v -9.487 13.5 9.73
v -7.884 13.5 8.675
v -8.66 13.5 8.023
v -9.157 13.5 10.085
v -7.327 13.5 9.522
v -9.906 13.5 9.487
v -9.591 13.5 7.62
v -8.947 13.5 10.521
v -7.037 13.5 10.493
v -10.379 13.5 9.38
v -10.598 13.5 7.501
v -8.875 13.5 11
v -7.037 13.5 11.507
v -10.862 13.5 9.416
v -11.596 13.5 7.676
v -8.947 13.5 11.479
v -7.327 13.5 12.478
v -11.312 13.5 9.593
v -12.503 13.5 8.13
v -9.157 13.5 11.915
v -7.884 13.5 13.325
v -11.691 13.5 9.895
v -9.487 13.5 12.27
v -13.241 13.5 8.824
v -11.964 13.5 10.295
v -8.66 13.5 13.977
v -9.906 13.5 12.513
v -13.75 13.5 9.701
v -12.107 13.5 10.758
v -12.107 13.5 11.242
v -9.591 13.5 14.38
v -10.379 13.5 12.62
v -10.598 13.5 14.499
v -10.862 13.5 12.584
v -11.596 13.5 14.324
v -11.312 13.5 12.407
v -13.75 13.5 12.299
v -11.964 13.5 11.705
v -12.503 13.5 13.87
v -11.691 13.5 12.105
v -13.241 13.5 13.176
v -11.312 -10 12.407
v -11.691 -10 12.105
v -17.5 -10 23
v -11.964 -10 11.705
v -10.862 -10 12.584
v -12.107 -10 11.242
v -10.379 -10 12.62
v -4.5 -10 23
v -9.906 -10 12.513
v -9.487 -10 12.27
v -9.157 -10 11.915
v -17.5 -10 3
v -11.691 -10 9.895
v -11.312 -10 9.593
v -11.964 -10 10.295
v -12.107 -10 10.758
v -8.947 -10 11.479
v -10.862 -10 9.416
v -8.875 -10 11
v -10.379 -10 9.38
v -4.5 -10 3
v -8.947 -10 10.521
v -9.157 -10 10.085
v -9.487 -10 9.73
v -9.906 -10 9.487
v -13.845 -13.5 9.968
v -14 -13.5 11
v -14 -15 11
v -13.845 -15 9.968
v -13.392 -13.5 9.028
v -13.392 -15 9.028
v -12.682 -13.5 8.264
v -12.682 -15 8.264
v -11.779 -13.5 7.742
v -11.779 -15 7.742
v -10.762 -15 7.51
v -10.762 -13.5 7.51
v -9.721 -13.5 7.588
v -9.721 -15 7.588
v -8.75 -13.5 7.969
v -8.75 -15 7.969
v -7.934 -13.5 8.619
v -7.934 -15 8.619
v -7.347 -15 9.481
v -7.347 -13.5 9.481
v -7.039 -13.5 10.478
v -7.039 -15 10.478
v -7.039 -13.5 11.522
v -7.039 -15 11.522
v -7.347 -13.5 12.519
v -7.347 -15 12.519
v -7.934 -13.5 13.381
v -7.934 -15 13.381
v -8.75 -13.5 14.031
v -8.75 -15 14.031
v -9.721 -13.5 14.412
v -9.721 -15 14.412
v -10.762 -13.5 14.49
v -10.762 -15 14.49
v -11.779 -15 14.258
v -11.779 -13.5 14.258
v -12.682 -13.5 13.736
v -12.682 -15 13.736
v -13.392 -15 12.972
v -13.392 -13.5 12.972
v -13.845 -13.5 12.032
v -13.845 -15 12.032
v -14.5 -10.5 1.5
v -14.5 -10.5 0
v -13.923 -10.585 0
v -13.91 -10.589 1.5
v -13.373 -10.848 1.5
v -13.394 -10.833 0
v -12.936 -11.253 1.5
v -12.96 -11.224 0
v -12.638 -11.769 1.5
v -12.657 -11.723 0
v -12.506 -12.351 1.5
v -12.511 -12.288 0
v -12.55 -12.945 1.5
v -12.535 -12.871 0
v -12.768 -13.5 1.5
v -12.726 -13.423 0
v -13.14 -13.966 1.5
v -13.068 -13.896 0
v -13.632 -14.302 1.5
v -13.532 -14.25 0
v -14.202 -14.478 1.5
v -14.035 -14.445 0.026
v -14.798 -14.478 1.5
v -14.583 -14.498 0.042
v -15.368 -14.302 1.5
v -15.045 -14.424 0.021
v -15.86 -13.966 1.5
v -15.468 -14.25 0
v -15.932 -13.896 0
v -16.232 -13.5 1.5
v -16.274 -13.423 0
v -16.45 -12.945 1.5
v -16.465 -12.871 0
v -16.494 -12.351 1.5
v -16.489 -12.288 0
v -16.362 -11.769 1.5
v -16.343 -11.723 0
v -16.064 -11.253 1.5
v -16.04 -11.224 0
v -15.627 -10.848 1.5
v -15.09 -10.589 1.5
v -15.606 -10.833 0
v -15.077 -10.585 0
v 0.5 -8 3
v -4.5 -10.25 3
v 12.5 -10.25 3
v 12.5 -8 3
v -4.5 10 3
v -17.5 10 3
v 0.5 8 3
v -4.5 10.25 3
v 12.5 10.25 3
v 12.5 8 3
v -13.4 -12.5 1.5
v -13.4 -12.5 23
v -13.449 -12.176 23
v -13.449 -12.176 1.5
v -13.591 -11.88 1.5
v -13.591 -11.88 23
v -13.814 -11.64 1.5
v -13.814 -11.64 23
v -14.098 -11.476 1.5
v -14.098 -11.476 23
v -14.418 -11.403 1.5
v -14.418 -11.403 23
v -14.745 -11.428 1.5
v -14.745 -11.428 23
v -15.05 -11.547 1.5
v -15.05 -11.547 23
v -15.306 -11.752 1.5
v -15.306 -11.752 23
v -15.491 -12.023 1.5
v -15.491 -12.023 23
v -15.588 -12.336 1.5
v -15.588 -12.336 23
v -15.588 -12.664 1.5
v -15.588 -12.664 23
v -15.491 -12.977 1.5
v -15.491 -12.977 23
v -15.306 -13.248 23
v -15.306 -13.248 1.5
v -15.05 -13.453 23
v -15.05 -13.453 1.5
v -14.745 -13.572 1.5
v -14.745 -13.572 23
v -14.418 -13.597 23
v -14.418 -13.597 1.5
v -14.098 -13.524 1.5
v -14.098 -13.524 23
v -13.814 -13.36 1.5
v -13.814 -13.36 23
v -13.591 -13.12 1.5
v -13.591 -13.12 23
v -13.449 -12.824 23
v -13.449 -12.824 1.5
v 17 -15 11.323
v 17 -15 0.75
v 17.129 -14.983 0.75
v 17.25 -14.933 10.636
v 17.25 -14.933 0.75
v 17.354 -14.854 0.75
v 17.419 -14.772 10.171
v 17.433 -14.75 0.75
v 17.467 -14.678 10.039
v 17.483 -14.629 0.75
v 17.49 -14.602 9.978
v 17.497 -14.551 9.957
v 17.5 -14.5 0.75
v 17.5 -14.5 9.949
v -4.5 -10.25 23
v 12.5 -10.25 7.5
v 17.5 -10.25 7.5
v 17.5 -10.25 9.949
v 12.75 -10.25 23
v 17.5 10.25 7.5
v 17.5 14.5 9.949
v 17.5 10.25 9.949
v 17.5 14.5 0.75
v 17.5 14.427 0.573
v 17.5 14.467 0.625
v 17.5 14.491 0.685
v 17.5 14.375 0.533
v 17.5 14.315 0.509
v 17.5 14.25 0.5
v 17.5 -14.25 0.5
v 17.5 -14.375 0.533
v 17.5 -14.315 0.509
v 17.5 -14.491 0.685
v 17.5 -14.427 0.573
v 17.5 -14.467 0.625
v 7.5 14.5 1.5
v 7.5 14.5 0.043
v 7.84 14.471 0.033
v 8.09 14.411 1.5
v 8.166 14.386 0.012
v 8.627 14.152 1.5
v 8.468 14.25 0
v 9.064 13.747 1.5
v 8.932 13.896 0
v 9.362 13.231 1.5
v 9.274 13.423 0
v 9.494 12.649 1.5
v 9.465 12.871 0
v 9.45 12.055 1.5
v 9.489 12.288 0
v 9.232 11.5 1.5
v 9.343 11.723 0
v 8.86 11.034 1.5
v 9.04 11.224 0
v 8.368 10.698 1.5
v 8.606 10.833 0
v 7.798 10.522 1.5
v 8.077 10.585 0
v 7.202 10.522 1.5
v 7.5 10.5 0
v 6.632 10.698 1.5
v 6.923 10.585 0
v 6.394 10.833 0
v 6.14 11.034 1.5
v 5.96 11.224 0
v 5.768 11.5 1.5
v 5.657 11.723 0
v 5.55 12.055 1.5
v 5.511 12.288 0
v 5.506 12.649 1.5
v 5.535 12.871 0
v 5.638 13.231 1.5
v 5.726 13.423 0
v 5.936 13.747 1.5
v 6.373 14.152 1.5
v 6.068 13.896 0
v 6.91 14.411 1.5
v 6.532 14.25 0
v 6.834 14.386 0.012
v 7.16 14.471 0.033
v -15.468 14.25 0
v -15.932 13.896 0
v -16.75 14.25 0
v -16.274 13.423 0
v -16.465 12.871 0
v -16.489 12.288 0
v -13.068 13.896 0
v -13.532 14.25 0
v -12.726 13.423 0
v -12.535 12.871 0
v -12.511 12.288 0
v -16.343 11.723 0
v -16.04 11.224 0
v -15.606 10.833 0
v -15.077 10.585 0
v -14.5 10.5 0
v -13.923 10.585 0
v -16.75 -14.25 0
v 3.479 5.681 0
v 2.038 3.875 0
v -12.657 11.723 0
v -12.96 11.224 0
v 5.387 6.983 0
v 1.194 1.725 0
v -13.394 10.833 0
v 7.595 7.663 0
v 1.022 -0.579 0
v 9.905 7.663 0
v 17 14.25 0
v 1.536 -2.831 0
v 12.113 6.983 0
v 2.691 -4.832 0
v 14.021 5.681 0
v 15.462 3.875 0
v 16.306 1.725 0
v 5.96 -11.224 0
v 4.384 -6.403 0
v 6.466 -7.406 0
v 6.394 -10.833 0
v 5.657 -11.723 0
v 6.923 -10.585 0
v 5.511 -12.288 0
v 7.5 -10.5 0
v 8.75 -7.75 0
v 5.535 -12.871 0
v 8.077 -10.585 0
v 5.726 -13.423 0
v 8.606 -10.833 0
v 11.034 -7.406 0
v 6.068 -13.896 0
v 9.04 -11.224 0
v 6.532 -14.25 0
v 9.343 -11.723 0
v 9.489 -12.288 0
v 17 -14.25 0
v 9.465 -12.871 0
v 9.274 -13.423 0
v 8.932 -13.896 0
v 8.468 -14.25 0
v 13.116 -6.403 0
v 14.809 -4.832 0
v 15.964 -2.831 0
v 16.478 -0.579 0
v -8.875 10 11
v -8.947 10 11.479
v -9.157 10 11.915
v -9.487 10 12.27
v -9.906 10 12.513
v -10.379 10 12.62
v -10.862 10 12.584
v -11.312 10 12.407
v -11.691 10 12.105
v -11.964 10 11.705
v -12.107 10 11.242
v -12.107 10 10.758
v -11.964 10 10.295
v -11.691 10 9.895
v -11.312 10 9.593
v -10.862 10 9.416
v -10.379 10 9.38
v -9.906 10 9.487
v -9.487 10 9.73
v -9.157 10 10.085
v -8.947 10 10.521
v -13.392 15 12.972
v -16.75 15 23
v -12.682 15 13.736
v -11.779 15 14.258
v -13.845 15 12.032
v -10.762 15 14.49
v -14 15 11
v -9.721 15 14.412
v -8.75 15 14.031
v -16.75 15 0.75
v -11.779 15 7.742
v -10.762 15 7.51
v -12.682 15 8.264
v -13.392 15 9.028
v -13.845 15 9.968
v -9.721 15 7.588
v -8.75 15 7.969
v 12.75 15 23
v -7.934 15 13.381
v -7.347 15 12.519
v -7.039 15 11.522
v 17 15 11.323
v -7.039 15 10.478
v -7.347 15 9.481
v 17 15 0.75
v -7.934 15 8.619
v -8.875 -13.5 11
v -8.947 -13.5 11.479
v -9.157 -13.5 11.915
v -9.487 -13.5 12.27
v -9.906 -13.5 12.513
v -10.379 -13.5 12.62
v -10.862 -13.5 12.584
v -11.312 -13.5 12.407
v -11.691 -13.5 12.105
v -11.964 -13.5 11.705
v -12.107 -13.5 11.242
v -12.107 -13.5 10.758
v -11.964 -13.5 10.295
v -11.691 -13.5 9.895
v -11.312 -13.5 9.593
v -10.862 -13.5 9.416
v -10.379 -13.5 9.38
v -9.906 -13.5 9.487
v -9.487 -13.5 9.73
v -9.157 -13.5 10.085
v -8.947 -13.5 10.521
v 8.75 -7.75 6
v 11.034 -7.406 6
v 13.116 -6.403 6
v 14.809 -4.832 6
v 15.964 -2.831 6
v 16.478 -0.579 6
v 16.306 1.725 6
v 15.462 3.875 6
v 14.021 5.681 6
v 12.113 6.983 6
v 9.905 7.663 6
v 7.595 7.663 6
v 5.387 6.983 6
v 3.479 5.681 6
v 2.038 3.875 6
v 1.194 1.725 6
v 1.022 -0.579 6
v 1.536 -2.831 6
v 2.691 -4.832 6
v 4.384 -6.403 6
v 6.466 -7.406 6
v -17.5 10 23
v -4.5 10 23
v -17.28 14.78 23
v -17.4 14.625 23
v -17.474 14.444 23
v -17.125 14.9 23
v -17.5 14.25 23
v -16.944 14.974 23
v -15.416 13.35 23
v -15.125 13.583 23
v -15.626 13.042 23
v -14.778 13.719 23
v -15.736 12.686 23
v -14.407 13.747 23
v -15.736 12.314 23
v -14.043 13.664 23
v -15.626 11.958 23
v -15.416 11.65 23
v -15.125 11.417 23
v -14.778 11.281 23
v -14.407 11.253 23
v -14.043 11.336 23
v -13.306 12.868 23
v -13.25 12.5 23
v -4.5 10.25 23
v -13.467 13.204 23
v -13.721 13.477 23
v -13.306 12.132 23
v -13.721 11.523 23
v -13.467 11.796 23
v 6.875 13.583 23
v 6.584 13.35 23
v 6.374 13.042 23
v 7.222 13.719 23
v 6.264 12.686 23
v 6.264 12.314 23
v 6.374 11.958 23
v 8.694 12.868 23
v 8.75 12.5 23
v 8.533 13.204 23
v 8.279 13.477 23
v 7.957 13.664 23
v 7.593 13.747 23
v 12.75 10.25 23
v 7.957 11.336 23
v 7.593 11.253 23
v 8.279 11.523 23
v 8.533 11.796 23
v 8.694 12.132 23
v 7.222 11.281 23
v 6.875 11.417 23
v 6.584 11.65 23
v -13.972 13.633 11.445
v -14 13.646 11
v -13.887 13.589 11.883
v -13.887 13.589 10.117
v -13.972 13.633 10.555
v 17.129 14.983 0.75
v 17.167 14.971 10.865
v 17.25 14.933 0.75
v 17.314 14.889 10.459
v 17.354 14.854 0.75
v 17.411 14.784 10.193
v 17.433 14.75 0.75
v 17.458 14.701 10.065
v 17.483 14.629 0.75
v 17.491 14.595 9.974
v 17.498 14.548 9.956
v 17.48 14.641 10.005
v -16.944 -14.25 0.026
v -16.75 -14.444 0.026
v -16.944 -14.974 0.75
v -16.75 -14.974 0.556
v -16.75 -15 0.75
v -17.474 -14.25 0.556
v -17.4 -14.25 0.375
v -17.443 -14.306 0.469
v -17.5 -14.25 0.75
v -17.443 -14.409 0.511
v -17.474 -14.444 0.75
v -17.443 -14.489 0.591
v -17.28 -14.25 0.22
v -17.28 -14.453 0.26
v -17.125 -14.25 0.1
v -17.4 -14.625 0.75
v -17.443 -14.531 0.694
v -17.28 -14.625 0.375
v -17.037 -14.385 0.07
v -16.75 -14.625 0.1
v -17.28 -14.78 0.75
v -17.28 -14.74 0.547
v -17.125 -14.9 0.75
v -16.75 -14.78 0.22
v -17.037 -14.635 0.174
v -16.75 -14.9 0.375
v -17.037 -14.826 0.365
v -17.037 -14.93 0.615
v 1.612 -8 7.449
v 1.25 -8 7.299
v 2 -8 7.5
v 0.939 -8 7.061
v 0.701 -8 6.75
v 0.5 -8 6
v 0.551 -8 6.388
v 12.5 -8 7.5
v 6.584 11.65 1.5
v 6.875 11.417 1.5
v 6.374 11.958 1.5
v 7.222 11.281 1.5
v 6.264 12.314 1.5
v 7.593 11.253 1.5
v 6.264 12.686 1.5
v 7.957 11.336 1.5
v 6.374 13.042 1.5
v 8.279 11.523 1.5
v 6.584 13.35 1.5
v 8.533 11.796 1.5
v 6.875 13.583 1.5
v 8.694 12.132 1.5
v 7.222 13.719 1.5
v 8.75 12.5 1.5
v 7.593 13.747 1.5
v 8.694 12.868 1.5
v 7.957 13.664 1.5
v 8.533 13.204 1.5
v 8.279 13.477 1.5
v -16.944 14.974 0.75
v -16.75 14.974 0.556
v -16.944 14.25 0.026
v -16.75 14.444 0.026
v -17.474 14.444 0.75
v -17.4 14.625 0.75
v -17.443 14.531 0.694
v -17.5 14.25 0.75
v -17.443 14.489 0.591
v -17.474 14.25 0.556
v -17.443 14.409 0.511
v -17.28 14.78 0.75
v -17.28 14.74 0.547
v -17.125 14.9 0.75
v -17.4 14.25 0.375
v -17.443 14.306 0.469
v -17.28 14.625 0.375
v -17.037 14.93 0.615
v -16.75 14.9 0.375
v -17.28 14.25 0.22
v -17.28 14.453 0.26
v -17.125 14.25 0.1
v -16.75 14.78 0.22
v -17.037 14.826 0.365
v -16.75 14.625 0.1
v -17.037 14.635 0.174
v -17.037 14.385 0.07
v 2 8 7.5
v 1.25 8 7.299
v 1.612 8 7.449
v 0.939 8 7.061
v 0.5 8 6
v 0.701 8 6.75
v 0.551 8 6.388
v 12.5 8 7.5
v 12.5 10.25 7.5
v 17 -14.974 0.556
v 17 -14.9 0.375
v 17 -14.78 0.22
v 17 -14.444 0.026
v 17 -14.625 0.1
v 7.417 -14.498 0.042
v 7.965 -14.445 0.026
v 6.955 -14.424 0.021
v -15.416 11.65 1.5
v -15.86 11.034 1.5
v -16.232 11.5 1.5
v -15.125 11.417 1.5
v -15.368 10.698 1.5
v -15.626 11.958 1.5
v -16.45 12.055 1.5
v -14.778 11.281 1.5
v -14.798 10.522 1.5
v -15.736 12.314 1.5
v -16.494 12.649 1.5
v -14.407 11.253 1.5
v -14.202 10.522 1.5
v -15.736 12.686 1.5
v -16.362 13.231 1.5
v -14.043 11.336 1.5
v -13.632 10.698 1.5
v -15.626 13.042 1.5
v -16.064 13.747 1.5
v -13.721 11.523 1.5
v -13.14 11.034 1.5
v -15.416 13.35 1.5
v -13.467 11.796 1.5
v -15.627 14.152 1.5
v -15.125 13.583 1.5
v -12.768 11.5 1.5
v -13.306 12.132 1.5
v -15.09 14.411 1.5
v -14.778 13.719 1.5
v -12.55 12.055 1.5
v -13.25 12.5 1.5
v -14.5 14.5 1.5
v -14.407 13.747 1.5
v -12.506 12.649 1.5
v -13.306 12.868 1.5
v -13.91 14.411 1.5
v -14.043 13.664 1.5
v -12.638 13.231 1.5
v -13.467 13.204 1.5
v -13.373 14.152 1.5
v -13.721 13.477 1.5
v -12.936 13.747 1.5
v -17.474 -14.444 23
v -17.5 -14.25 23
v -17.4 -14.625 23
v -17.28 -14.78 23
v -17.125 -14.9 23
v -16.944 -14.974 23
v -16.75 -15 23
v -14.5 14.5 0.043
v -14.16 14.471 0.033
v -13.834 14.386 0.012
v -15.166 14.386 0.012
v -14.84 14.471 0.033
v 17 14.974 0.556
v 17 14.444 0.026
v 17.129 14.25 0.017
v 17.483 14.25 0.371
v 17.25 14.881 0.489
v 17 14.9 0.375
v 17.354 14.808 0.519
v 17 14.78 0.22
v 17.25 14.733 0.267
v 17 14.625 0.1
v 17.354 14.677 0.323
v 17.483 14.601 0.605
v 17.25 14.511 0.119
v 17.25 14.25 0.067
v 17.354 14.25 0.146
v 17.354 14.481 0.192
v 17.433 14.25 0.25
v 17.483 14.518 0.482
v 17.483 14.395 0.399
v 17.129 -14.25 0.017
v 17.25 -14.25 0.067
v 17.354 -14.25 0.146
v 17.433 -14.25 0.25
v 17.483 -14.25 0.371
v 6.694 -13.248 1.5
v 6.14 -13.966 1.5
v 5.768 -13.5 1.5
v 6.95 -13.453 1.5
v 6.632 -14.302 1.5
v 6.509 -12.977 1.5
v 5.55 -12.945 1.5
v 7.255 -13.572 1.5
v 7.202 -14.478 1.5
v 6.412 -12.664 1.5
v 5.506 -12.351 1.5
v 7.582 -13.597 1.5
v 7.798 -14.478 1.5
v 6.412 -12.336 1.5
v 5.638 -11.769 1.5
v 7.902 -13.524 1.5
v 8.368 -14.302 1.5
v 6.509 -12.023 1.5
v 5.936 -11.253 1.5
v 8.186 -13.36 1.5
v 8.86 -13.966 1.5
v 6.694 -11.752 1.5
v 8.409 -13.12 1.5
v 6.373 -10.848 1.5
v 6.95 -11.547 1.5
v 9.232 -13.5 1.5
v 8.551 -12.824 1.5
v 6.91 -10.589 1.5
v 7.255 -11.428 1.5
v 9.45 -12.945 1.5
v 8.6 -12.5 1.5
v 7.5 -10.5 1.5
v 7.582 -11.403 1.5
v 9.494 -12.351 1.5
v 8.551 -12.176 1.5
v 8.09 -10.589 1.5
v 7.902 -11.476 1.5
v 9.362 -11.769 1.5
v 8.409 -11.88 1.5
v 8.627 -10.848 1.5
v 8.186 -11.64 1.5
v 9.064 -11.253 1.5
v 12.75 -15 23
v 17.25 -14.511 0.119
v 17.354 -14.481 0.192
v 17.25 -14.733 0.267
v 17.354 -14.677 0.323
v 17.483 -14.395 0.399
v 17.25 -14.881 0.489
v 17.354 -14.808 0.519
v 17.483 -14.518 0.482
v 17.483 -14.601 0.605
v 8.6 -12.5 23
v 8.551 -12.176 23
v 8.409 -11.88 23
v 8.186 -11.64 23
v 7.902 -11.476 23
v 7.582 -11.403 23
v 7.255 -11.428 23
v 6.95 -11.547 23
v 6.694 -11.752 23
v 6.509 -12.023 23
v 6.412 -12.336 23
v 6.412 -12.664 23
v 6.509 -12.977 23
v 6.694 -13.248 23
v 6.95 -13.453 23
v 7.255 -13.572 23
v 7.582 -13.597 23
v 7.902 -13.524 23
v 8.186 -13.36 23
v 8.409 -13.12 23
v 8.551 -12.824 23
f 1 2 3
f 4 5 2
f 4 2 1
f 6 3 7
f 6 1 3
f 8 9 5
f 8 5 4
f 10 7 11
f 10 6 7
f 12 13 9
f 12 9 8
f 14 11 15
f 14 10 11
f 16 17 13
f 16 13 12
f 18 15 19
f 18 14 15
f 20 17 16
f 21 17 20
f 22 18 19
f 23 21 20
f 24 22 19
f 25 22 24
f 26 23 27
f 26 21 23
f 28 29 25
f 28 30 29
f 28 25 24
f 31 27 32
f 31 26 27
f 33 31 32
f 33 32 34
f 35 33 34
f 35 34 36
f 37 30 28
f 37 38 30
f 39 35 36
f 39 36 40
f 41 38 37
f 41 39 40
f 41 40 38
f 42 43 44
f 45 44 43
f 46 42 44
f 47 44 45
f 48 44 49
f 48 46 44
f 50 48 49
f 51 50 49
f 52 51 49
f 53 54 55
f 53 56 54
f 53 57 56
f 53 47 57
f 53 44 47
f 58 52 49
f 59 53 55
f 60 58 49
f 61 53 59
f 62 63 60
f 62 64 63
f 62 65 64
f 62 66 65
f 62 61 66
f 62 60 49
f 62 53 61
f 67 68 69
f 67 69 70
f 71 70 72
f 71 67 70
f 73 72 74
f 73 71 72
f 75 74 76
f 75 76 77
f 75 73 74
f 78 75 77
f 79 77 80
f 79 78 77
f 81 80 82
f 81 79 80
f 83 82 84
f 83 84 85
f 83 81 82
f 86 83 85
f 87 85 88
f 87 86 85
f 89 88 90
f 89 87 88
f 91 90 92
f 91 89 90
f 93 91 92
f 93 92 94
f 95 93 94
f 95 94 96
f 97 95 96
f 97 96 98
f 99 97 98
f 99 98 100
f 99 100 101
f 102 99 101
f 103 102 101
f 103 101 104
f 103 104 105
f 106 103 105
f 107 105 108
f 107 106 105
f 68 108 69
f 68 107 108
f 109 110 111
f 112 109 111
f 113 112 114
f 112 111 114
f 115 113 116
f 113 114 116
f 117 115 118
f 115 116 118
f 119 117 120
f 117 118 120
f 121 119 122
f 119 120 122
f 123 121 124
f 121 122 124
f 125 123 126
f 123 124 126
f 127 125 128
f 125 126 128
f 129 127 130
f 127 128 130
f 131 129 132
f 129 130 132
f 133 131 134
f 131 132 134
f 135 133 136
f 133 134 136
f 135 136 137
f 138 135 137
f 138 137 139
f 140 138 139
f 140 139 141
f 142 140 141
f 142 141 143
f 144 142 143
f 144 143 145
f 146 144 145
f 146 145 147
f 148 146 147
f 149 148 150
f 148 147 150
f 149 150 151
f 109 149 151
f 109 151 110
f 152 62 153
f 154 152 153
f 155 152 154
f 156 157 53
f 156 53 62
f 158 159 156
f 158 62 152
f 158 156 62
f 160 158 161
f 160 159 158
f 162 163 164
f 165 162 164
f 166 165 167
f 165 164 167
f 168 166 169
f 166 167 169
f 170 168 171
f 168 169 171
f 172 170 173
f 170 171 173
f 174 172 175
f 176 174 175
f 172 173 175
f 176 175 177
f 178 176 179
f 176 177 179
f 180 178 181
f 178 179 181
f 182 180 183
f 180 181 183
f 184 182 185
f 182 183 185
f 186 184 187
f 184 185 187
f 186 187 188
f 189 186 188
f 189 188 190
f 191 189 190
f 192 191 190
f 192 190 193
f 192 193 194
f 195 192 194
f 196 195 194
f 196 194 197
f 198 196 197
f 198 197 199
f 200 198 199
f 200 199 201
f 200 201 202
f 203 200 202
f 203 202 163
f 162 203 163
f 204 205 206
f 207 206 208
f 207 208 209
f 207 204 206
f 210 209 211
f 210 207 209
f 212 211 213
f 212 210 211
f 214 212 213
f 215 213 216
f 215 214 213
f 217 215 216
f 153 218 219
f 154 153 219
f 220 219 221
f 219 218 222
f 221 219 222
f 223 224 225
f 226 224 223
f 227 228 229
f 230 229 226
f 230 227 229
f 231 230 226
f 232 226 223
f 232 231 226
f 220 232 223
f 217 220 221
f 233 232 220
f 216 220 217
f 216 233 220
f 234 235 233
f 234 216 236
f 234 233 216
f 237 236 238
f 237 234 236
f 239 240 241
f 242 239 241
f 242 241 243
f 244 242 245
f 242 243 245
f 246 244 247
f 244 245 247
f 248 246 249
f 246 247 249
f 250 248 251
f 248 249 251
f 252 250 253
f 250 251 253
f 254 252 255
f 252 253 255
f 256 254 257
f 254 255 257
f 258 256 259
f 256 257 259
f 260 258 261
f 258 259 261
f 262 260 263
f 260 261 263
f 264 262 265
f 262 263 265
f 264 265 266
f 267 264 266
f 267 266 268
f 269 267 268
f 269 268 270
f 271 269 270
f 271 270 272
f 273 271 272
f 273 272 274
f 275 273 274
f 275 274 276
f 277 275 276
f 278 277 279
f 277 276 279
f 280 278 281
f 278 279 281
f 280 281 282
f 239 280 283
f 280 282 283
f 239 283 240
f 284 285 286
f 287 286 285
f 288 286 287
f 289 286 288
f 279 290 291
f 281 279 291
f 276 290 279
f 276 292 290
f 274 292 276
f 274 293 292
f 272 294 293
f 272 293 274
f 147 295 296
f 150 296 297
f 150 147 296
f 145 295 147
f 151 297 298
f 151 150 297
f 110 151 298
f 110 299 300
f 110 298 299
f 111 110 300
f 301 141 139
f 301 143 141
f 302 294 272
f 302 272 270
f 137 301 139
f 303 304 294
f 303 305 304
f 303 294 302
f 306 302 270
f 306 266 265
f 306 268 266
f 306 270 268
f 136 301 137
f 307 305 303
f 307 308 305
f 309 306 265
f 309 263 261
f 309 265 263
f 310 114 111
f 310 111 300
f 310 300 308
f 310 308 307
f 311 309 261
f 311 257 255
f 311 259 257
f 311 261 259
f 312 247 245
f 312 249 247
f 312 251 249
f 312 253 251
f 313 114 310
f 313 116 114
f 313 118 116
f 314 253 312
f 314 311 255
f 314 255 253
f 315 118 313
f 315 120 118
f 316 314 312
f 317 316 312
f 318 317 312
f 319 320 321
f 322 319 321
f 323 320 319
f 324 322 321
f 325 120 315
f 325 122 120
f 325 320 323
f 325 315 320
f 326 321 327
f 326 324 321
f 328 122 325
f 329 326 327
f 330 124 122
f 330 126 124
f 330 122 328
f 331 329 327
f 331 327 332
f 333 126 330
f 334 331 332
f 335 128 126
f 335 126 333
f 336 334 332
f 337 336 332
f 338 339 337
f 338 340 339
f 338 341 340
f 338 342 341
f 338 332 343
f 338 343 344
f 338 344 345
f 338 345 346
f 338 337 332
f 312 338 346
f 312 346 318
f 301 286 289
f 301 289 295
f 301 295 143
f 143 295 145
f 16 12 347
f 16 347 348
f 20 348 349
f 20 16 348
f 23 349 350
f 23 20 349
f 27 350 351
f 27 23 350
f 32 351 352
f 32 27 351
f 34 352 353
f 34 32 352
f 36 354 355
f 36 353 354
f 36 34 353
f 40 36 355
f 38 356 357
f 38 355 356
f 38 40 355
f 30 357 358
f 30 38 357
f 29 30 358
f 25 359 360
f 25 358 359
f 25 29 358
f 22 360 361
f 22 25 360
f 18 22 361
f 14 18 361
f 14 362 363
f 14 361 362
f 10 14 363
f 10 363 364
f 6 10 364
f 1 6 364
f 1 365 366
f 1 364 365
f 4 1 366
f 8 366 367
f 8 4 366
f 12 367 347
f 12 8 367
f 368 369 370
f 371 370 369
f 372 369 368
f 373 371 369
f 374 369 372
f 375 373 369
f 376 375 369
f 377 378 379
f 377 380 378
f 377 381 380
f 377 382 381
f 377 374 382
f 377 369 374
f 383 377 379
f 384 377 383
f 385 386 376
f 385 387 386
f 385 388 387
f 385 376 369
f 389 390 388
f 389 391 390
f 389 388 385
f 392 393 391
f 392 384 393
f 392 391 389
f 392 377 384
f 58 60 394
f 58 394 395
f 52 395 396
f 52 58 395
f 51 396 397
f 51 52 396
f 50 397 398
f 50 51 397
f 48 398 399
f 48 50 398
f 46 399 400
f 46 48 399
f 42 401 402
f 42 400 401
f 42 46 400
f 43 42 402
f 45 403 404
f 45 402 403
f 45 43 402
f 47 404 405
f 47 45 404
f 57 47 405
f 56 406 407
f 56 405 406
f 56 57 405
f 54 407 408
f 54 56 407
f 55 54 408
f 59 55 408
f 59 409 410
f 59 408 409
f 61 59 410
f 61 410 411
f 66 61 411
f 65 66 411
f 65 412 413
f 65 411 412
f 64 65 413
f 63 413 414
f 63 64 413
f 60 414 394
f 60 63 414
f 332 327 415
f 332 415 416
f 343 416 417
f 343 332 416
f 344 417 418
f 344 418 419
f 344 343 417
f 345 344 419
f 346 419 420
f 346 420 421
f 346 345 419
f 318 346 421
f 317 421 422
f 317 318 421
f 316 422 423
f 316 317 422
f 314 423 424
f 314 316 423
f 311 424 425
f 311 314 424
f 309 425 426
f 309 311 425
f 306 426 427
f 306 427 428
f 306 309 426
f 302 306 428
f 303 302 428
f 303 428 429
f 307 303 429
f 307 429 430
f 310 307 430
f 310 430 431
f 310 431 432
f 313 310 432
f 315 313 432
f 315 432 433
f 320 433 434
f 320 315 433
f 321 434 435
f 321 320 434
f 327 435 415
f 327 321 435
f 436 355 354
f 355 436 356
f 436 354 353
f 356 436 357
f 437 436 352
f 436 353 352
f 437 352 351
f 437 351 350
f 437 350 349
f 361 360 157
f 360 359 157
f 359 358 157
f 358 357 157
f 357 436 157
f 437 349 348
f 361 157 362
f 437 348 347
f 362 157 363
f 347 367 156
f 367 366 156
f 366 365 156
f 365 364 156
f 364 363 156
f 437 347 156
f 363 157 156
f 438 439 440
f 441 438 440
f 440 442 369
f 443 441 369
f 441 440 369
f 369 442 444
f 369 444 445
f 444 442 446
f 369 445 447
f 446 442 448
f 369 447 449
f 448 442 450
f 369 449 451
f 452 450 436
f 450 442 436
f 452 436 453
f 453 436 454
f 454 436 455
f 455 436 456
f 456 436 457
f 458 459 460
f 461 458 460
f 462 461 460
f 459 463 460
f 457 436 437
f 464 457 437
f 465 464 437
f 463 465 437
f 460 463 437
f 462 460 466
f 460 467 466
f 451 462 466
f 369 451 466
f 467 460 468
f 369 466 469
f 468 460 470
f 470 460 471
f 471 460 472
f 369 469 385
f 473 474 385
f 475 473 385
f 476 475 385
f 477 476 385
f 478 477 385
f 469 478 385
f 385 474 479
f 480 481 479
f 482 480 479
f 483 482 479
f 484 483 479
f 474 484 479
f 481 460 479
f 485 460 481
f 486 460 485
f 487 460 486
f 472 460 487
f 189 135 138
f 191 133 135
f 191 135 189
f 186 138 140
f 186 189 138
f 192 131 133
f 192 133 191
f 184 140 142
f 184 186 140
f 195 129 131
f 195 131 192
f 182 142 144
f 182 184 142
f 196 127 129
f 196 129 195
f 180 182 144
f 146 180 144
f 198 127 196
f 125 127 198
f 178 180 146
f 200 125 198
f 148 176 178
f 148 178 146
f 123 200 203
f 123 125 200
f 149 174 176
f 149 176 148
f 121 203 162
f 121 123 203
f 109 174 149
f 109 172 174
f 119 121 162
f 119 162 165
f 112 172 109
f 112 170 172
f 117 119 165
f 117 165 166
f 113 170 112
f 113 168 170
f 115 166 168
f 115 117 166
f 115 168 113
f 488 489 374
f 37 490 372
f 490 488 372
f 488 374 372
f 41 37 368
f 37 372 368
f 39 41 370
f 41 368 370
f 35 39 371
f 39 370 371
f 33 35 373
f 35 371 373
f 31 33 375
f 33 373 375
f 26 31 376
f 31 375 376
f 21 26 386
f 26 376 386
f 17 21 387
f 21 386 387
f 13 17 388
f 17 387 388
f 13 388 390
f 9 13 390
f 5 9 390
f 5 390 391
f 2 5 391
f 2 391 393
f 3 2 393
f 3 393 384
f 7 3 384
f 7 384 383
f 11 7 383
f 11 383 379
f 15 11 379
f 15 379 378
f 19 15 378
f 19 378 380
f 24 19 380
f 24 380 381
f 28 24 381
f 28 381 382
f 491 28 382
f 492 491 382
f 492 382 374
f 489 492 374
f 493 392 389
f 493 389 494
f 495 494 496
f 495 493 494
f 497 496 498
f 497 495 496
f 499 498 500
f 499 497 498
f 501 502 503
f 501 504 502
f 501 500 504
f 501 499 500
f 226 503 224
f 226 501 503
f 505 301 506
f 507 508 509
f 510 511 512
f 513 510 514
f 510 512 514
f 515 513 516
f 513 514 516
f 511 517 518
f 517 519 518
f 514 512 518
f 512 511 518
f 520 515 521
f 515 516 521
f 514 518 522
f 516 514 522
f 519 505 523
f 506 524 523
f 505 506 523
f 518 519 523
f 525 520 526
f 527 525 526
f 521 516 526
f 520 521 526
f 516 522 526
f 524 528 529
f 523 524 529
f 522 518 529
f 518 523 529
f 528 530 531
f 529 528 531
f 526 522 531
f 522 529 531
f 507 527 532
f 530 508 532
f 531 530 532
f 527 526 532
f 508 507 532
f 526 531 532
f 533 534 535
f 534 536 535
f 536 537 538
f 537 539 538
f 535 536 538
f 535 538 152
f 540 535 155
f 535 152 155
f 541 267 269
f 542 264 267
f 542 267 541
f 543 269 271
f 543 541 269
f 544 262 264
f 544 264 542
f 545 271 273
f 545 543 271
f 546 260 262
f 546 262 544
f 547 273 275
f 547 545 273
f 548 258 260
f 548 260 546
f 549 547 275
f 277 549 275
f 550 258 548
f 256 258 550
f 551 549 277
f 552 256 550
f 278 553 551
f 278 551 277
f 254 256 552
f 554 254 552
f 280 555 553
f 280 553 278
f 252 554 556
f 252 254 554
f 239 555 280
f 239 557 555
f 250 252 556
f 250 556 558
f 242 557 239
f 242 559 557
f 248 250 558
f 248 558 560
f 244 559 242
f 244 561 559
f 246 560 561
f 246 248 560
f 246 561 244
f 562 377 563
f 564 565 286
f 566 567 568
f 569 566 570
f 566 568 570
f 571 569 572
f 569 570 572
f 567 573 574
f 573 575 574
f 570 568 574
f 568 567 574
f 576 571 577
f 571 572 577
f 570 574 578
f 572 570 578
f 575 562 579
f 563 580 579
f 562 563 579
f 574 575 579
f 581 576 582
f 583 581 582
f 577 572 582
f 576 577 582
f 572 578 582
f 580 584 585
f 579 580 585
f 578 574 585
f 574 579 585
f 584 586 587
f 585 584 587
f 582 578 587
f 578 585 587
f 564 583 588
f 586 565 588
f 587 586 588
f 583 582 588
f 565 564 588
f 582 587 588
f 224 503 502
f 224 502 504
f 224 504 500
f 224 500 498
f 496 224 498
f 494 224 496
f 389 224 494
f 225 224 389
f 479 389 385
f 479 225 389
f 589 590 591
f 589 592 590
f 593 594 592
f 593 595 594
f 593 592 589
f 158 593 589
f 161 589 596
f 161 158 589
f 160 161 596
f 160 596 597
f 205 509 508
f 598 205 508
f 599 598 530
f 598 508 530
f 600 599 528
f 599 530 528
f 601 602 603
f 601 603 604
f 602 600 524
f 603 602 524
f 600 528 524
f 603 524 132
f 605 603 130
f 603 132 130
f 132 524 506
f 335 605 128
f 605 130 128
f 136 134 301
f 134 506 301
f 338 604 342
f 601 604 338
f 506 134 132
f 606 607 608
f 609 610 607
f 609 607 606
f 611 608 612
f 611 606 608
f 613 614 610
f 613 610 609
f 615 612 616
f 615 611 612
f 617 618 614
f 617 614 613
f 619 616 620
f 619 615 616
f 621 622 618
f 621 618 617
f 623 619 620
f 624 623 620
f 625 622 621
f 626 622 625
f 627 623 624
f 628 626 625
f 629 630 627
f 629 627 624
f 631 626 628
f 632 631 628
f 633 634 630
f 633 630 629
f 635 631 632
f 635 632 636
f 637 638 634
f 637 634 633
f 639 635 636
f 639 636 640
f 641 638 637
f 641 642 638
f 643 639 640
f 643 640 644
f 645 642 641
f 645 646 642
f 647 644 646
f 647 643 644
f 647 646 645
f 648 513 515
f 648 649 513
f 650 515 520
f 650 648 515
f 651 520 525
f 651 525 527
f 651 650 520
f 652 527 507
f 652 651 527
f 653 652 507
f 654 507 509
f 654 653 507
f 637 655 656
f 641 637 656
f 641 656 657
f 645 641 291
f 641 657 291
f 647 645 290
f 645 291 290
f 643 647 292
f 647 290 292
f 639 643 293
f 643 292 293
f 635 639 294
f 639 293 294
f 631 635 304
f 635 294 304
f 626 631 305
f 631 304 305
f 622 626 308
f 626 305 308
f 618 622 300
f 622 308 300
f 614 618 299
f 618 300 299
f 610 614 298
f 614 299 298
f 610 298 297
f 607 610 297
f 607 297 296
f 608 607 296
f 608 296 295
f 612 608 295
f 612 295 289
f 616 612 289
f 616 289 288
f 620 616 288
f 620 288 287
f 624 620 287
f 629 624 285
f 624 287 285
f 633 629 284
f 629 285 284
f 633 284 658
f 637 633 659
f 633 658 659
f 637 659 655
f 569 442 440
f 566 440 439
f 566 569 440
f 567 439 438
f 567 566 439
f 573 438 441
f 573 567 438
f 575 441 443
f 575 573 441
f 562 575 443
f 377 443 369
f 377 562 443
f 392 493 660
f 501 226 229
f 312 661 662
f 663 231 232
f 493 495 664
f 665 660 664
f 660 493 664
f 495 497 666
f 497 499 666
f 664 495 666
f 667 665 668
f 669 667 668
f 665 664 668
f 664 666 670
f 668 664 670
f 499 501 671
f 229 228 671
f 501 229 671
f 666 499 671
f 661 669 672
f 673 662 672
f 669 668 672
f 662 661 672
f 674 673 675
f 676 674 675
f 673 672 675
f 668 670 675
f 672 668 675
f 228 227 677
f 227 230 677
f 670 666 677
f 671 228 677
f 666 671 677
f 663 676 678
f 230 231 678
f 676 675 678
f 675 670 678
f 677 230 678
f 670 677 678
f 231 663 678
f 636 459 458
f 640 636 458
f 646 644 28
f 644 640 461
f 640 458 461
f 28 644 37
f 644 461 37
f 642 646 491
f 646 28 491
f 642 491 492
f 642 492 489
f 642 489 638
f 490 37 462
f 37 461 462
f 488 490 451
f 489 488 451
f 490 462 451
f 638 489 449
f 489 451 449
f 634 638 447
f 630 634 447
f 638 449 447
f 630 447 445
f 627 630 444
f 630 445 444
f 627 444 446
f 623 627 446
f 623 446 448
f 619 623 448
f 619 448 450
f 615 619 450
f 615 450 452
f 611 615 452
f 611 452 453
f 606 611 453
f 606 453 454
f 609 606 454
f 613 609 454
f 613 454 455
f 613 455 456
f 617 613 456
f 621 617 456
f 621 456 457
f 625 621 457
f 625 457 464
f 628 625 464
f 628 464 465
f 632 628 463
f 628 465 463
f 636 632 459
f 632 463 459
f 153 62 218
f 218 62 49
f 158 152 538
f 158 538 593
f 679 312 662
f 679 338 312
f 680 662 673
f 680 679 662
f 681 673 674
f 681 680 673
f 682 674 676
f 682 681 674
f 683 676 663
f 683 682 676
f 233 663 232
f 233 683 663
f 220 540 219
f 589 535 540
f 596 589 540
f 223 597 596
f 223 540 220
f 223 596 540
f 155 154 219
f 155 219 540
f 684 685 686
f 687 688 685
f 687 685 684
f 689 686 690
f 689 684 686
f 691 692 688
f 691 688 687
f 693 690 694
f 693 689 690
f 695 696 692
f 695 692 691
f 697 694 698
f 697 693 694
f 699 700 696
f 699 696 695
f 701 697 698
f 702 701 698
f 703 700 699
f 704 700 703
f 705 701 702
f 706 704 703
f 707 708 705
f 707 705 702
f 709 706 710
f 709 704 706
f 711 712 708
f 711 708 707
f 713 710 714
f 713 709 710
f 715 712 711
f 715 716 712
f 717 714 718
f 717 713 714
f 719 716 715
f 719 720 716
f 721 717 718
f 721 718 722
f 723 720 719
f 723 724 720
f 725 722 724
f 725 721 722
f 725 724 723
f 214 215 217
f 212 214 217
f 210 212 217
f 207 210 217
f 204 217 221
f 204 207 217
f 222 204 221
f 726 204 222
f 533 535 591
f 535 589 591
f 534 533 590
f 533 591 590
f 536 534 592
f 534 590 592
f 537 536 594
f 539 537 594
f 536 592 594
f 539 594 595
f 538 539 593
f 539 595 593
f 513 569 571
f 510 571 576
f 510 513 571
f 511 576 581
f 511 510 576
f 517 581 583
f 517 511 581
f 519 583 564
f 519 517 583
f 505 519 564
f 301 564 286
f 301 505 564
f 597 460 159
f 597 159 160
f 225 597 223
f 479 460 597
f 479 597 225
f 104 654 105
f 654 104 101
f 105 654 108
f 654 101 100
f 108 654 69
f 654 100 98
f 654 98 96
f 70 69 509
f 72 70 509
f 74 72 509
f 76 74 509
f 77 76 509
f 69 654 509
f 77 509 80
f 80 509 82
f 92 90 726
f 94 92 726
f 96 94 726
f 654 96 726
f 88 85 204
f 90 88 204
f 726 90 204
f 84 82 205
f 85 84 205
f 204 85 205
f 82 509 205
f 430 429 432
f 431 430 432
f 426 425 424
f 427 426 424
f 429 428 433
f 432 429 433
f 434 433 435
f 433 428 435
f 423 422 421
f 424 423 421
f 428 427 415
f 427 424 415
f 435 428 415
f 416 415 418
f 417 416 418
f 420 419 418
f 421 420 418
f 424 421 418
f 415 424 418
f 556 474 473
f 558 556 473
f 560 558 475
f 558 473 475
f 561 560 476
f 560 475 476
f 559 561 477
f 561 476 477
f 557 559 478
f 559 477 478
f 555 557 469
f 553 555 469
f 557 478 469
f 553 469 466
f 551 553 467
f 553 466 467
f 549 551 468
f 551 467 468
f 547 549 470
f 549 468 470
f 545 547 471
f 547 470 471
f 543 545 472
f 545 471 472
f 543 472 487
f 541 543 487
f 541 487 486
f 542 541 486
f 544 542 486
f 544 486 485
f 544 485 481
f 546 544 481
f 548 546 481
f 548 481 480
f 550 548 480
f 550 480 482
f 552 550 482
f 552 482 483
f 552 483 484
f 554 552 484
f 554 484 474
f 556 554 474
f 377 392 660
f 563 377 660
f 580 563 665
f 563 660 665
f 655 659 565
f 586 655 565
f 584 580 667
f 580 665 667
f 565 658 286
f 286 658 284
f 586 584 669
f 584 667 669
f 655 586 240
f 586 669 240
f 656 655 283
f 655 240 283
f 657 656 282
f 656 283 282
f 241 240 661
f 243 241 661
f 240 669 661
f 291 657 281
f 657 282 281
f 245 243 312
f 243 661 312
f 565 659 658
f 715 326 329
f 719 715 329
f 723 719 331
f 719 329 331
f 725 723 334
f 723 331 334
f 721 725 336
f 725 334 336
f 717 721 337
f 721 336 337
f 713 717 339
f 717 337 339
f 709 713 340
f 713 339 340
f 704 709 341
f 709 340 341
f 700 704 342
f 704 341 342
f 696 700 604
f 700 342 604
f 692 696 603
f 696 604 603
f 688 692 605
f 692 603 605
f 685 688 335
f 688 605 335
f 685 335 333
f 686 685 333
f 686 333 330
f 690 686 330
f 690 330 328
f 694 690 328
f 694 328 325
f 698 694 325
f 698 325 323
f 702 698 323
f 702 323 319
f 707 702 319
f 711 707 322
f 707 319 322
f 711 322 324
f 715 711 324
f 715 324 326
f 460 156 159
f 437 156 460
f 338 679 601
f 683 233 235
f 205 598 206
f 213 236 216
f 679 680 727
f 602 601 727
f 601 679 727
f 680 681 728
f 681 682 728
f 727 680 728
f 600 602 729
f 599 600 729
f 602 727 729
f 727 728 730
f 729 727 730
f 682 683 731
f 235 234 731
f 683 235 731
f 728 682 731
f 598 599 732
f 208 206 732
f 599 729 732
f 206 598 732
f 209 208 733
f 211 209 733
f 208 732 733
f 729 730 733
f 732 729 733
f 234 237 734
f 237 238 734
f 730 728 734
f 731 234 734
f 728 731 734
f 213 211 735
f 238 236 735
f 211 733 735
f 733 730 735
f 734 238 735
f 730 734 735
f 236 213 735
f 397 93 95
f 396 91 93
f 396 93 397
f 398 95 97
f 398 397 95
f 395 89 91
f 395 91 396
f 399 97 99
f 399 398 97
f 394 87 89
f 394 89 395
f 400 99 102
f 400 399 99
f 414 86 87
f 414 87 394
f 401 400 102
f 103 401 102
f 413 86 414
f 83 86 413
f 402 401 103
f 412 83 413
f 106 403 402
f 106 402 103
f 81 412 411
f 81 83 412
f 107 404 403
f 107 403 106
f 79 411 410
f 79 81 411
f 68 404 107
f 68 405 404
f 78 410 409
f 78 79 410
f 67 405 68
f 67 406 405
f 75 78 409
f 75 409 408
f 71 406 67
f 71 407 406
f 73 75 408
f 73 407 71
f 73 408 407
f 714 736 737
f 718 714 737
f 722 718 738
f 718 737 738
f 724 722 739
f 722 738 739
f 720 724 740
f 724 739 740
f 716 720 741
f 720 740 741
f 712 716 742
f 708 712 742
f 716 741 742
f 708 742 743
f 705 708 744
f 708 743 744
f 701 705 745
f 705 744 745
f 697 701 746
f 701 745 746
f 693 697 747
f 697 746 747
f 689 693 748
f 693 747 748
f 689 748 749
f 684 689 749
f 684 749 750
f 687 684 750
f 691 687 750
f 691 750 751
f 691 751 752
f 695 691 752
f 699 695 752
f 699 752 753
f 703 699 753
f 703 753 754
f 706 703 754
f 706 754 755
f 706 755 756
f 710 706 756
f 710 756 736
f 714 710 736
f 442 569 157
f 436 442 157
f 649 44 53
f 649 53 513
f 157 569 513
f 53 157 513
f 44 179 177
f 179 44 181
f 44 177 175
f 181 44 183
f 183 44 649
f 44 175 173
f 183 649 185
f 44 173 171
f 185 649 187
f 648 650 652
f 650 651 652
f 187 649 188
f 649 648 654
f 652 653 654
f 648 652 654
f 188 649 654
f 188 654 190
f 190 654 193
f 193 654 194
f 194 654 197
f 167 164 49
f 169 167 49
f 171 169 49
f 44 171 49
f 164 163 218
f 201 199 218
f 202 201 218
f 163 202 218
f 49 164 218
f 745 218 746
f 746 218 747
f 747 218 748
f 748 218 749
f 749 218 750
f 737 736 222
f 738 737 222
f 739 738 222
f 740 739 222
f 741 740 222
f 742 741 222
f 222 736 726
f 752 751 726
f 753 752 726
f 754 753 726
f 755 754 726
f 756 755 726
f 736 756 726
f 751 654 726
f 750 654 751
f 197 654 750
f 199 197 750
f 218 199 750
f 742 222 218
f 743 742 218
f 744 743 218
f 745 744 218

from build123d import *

# Parameters (mm, degrees)
SKETCH1_W              = 35
SKETCH1_H              = 20
BASE_PLATE_DEPTH       = 3
SKETCH2_W              = 35
SKETCH2_H              = 5
SIDE_WALLS_DEPTH       = 23
SKETCH4_R              = 1.1
SKETCH4_R_2            = 1.25
M2_SCREWS_DEPTH        = 23
SKETCH6_W              = 5
SKETCH6_H              = 20
RETURN_STOPPER_DEPTH   = 4.5
SKETCH9_W              = 12
SKETCH9_H              = 16
BOSS_EXTRUDE1_DEPTH    = 4.5
SKETCH7_R              = 7.75
MAGNET_POCKET_DEPTH    = 6
SKETCH8_R              = 2
M2_SCREW_HEAD_DEPTH    = 1.5
M3_ACHSLE_DEPTH        = 39.213217609
M3_ACHSLE_DEPTH_BACK   = 39.213217609
SKETCH5_R              = 1.625
SKETCH14_R             = 3.5
CUT_EXTRUDE1_DEPTH     = 1.5
CUT_EXTRUDE2_START     = -1.5
SKETCH15_R             = 3.5
CUT_EXTRUDE2_DEPTH     = 1.5
FILLET1_R              = 1.5
LEAVER_START           = -0.25
SKETCH11_W             = 22
SKETCH11_H             = 15.5
LEAVER_SPACE_DEPTH     = 20.5
SKETCH12_W             = 17
SKETCH12_H             = 4.5
MORE_SPACE_LEFT_DEPTH  = 0.25
SKETCH13_W             = 17
SKETCH13_H             = 4.5
MORE_SPACE_RIGHT_DEPTH = 0.25
FILLET2_R              = 0.75
FILLET3_R              = 0.75
FILLET4_R              = 0.75
FILLET5_R              = 0.5
CHAMFER1_SIZE          = 13.050517742
CHAMFER1_SIZE_2        = 4.75


with BuildPart() as part:
    # Sketch1 → Base Plate (new body)
    with BuildSketch(Plane.XY):
        Rectangle(SKETCH1_W, SKETCH1_H)
    extrude(amount=BASE_PLATE_DEPTH)

    # Sketch2 → Side Walls (add)
    with BuildSketch(Plane(origin=(0, 0, 0), x_dir=(1, 0, 0), z_dir=(0, 0, -1))):
        with Locations((0, -12.5)):
            Rectangle(SKETCH2_W, SKETCH2_H)
        with Locations((0, 12.5)):
            Rectangle(SKETCH2_W, SKETCH2_H)
    extrude(amount=-SIDE_WALLS_DEPTH)

    # Sketch4 → M2 Screws (cut)
    with BuildSketch(Plane.XY.offset(23)):
        with Locations((-14.5, -12.5)):
            Circle(SKETCH4_R)
        with Locations((7.5, -12.5)):
            Circle(SKETCH4_R)
        with Locations((7.5, 12.5)):
            Circle(SKETCH4_R_2)
        with Locations((-14.5, 12.5)):
            Circle(SKETCH4_R_2)
    extrude(amount=-M2_SCREWS_DEPTH, mode=Mode.SUBTRACT)

    # Sketch6 → Return Stopper (add)
    with BuildSketch(Plane.XY.offset(3)):
        with Locations((15, 0)):
            Rectangle(SKETCH6_W, SKETCH6_H)
    extrude(amount=RETURN_STOPPER_DEPTH)

    # Sketch9 → Boss-Extrude1 (add)
    with BuildSketch(Plane.XY.offset(3)):
        with Locations((6.5, 0)):
            Rectangle(SKETCH9_W, SKETCH9_H)
    extrude(amount=BOSS_EXTRUDE1_DEPTH)

    # Sketch7 → Magnet Pocket (cut)
    with BuildSketch(Plane(origin=(0, 0, 0), x_dir=(-1, 0, 0), z_dir=(0, 0, 1))):
        with Locations(Location((-8.75, 0, 0), (0, 0, 90))):
            Circle(SKETCH7_R)
    extrude(amount=MAGNET_POCKET_DEPTH, mode=Mode.SUBTRACT)

    # Sketch8 → M2 Screw Head (cut)
    with BuildSketch(Plane(origin=(0, 0, 0), x_dir=(1, 0, 0), z_dir=(0, 0, -1))):
        with Locations(Location((7.5, -12.5, 0), (0, 0, 270))):
            Circle(SKETCH8_R)
        with Locations(Location((-14.5, -12.5, 0), (0, 0, 270))):
            Circle(SKETCH8_R)
        with Locations(Location((7.5, 12.5, 0), (0, 0, 270))):
            Circle(SKETCH8_R)
        with Locations(Location((-14.5, 12.5, 0), (0, 0, 270))):
            Circle(SKETCH8_R)
    extrude(amount=-M2_SCREW_HEAD_DEPTH, mode=Mode.SUBTRACT)

    # Sketch5 → M3 Achsle (cut, two sides: drawn at the far end of the back side and taken through both)
    with BuildSketch(Plane.XZ.offset(-10).offset(-M3_ACHSLE_DEPTH_BACK)):
        with Locations((-10.5, 11)):
            Circle(SKETCH5_R)
    extrude(amount=M3_ACHSLE_DEPTH + M3_ACHSLE_DEPTH_BACK, mode=Mode.SUBTRACT)

    # Sketch14 → Cut-Extrude1 (cut)
    with BuildSketch(Plane(origin=(0, 15, 0), x_dir=(-1, 0, 0), z_dir=(0, 1, 0))):
        with Locations((10.5, 11)):
            Circle(SKETCH14_R)
    extrude(amount=-CUT_EXTRUDE1_DEPTH, mode=Mode.SUBTRACT)

    # Sketch15 → Cut-Extrude2 (cut)
    with BuildSketch(Plane.XZ.offset(15).offset(CUT_EXTRUDE2_START)):
        with Locations(Location((-10.5, 11, 0), (0, 0, 180))):
            Circle(SKETCH15_R)
    extrude(amount=CUT_EXTRUDE2_DEPTH, mode=Mode.SUBTRACT)

    # Fillet1
    fillet1_edges = [part.edges().sort_by_distance(p)[0] for p in [
        (0.5, 0, 7.5),
    ]]
    fillet(fillet1_edges, radius=FILLET1_R)

    # Sketch11 → Leaver Space (cut)
    with BuildSketch(Plane.XZ.offset(-10).offset(LEAVER_START)):
        with Locations((6.5, 15.25)):
            Rectangle(SKETCH11_W, SKETCH11_H)
    extrude(amount=LEAVER_SPACE_DEPTH, mode=Mode.SUBTRACT)

    # Sketch12 → More Space left (cut)
    with BuildSketch(Plane.XZ.offset(-10)):
        with Locations((4, 5.25)):
            Rectangle(SKETCH12_W, SKETCH12_H)
    extrude(amount=-MORE_SPACE_LEFT_DEPTH, mode=Mode.SUBTRACT)

    # Sketch13 → More Space right (cut)
    with BuildSketch(Plane(origin=(0, -10, 0), x_dir=(-1, 0, 0), z_dir=(0, 1, 0))):
        with Locations((-4, 5.25)):
            Rectangle(SKETCH13_W, SKETCH13_H)
    extrude(amount=-MORE_SPACE_RIGHT_DEPTH, mode=Mode.SUBTRACT)

    # Fillet2
    # the kernel refuses this fillet: 0.75 mm, written as the material it takes off along each edge
    with BuildSketch(Plane(origin=(19.375, 15, 0), x_dir=(0, -1, 0), z_dir=(-1, 0, 0))) as fillet2_piece_1:
        with BuildLine():
            CenterArc((FILLET2_R, FILLET2_R), FILLET2_R, 180, 90)
            Line((0, FILLET2_R), (0, 0))
            Line((0, 0), (FILLET2_R, 0))
        make_face()
    extrude(amount=38.75, mode=Mode.SUBTRACT)

    # Fillet3
    # the kernel refuses this fillet: 0.75 mm, written as the material it takes off along each edge
    with BuildSketch(Plane(origin=(-19.375, -15, 0), x_dir=(0, 1, 0), z_dir=(1, 0, 0))) as fillet3_piece_1:
        with BuildLine():
            CenterArc((FILLET3_R, FILLET3_R), FILLET3_R, 180, 90)
            Line((0, FILLET3_R), (0, 0))
            Line((0, 0), (FILLET3_R, 0))
        make_face()
    extrude(amount=38.75, mode=Mode.SUBTRACT)

    # Fillet4
    fillet4_edges = [part.edges().sort_by_distance(p)[0] for p in [
        (-17.5, -15, 11.875),
        (-17.5, 0, 0),
        (-17.5, 14.780330086, 0.219669914),
        (-17.5, -14.780330086, 0.219669914),
        (-17.5, 15, 11.875),
    ]]
    fillet(fillet4_edges, radius=FILLET4_R)

    # Fillet5
    fillet5_edges = [part.edges().sort_by_distance(p)[0] for p in [
        (17.5, -15, 11.875),
        (17.5, 14.780330086, 0.219669914),
        (17.5, 0, 0),
        (17.5, -14.780330086, 0.219669914),
        (17.5, 15, 11.875),
    ]]
    fillet(fillet5_edges, radius=FILLET5_R)

    # Chamfer1
    # the kernel refuses this chamfer: 13.050517742, 4.75 mm, written as the material it takes off along each edge
    with BuildSketch(Plane(origin=(17.5, -48.355584384, 23), x_dir=(0.013184058198645798, 0, -0.9999130865277316), z_dir=(0, 1, 0))) as chamfer1_piece_1:
        Polygon((CHAMFER1_SIZE * 0.999913086559, CHAMFER1_SIZE * 0.0131840581991), (-CHAMFER1_SIZE_2 * 0.0131840581986, CHAMFER1_SIZE_2 * 0.999913086528), (0, 0), align=None)
    extrude(amount=71.961168769, mode=Mode.SUBTRACT)
    with BuildSketch(Plane(origin=(17.5, -23.605584384, 23), x_dir=(-0.9950833631817486, 0, 0.09904090225205059), z_dir=(0, 1, 0))) as chamfer1_piece_2:
        Polygon((CHAMFER1_SIZE_2 * 0.995083363182, -CHAMFER1_SIZE_2 * 0.0990409022521), (-CHAMFER1_SIZE * 0.0990409022552, -CHAMFER1_SIZE * 0.995083363213), (0, 0), align=None)
    extrude(amount=71.961168769, mode=Mode.SUBTRACT)


solid = part.part
